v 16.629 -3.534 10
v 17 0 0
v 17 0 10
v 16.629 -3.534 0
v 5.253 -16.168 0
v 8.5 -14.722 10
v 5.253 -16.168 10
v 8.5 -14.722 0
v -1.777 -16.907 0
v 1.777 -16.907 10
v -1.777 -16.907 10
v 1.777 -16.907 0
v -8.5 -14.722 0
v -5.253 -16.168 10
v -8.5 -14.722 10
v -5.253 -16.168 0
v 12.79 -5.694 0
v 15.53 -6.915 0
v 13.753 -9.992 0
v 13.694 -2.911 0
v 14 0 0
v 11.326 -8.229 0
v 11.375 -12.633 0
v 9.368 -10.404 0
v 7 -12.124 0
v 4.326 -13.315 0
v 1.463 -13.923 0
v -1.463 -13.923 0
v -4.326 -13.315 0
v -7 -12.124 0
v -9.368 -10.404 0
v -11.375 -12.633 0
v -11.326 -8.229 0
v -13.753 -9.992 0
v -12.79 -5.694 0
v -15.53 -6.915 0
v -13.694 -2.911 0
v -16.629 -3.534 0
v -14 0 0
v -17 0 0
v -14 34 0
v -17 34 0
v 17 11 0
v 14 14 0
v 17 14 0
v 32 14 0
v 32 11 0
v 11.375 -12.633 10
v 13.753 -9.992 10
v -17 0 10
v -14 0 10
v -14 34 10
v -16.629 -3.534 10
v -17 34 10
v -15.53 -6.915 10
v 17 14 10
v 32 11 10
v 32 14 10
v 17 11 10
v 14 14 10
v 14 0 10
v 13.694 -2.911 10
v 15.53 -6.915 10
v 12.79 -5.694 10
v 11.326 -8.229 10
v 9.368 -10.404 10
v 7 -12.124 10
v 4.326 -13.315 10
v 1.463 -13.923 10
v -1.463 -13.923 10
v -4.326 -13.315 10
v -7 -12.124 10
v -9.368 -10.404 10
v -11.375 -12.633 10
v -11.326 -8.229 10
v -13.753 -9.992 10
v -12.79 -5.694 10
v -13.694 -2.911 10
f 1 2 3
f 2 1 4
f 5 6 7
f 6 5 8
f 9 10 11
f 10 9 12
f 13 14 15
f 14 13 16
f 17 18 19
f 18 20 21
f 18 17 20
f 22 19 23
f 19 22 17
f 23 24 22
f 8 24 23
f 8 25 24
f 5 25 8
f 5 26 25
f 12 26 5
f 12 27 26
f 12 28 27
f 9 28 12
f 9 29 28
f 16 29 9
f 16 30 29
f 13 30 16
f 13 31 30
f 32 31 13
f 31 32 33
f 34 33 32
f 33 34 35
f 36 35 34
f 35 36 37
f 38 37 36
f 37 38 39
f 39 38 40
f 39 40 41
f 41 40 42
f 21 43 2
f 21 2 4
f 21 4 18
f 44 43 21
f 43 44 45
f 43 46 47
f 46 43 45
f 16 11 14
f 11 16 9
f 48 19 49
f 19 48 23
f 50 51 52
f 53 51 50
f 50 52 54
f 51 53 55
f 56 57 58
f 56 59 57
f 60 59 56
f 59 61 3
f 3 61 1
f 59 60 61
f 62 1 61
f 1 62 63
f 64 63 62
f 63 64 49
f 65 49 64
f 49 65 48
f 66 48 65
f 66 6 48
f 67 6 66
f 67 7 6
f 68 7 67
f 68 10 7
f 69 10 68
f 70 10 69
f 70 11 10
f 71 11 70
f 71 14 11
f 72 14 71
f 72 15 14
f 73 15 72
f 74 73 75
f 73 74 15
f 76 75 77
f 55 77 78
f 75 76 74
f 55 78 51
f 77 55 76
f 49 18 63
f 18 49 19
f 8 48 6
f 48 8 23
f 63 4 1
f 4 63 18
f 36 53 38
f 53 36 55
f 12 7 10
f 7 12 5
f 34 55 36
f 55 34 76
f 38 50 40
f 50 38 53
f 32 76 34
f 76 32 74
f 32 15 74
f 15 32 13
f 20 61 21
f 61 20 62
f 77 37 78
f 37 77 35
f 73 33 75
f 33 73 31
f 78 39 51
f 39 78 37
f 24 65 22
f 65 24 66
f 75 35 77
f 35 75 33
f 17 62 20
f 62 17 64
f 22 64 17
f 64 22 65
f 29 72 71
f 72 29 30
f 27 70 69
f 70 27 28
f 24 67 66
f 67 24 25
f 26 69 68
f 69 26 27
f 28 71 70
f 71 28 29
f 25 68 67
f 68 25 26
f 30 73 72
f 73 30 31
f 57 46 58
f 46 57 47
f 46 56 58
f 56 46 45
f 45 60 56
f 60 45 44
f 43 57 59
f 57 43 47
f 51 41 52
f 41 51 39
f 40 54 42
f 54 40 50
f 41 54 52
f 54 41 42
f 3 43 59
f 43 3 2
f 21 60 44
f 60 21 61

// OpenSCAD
breite = 10;

difference() {
    cylinder(r=17, h= breite);
    translate([0,0,-1]) cylinder(r=14, h=(breite + 2));
    translate ([-17,0,-1]) cube([34,17,breite + 2]);
}

translate ([-17,0,0]) cube([3,34,breite]);
translate ([14,0,0]) cube([3,14,breite]);

difference() {
        translate ([15,11,0]) cube([17,3,breite]);
        #translate ([-14, 14,-1]) cube([47,24,breite + 2]);
}


/*
module aufhaengung() {
    difference() {
        translate ([0,0,0]) cube([20,100,10]);
        translate([10,10,-1]) cylinder(r=5, h=12);
    }
}

module schraube() {
    rotate(a=[270,0,0]) cylinder(r=2, h=22);
}


translate ([0,0,0]) aufhaengung();
translate ([0,0,30]) aufhaengung();

difference() {
    translate([0,100,0]) cube([120,20,40]);
    translate([50,99,10]) schraube();
    translate([50,99,30]) schraube();
    translate([80,99,10]) schraube();
    translate([80,99,30]) schraube();
}

module prism(l, w, h){
   rotate(a=[0,90,0]) polyhedron(
       points=[[0,0,0], [l,0,0], [l,w,0], [0,w,0], [0,w,h], [l,w,h]],
       faces=[[0,1,2,3],[5,4,3,2],[0,4,5,1],[0,3,4],[5,2,1]]
   );
}
translate([0,80,10]) cube([20,20,20]);
translate([20,80,00]) prism (-40,20,20);

difference() {
        translate([100,90,0]) cube([20,10,40]);
        translate([110,95,-1]) cylinder(r=2, h=42);
        translate([99,89,15]) cube([22,11,10]);
    
}
*/
